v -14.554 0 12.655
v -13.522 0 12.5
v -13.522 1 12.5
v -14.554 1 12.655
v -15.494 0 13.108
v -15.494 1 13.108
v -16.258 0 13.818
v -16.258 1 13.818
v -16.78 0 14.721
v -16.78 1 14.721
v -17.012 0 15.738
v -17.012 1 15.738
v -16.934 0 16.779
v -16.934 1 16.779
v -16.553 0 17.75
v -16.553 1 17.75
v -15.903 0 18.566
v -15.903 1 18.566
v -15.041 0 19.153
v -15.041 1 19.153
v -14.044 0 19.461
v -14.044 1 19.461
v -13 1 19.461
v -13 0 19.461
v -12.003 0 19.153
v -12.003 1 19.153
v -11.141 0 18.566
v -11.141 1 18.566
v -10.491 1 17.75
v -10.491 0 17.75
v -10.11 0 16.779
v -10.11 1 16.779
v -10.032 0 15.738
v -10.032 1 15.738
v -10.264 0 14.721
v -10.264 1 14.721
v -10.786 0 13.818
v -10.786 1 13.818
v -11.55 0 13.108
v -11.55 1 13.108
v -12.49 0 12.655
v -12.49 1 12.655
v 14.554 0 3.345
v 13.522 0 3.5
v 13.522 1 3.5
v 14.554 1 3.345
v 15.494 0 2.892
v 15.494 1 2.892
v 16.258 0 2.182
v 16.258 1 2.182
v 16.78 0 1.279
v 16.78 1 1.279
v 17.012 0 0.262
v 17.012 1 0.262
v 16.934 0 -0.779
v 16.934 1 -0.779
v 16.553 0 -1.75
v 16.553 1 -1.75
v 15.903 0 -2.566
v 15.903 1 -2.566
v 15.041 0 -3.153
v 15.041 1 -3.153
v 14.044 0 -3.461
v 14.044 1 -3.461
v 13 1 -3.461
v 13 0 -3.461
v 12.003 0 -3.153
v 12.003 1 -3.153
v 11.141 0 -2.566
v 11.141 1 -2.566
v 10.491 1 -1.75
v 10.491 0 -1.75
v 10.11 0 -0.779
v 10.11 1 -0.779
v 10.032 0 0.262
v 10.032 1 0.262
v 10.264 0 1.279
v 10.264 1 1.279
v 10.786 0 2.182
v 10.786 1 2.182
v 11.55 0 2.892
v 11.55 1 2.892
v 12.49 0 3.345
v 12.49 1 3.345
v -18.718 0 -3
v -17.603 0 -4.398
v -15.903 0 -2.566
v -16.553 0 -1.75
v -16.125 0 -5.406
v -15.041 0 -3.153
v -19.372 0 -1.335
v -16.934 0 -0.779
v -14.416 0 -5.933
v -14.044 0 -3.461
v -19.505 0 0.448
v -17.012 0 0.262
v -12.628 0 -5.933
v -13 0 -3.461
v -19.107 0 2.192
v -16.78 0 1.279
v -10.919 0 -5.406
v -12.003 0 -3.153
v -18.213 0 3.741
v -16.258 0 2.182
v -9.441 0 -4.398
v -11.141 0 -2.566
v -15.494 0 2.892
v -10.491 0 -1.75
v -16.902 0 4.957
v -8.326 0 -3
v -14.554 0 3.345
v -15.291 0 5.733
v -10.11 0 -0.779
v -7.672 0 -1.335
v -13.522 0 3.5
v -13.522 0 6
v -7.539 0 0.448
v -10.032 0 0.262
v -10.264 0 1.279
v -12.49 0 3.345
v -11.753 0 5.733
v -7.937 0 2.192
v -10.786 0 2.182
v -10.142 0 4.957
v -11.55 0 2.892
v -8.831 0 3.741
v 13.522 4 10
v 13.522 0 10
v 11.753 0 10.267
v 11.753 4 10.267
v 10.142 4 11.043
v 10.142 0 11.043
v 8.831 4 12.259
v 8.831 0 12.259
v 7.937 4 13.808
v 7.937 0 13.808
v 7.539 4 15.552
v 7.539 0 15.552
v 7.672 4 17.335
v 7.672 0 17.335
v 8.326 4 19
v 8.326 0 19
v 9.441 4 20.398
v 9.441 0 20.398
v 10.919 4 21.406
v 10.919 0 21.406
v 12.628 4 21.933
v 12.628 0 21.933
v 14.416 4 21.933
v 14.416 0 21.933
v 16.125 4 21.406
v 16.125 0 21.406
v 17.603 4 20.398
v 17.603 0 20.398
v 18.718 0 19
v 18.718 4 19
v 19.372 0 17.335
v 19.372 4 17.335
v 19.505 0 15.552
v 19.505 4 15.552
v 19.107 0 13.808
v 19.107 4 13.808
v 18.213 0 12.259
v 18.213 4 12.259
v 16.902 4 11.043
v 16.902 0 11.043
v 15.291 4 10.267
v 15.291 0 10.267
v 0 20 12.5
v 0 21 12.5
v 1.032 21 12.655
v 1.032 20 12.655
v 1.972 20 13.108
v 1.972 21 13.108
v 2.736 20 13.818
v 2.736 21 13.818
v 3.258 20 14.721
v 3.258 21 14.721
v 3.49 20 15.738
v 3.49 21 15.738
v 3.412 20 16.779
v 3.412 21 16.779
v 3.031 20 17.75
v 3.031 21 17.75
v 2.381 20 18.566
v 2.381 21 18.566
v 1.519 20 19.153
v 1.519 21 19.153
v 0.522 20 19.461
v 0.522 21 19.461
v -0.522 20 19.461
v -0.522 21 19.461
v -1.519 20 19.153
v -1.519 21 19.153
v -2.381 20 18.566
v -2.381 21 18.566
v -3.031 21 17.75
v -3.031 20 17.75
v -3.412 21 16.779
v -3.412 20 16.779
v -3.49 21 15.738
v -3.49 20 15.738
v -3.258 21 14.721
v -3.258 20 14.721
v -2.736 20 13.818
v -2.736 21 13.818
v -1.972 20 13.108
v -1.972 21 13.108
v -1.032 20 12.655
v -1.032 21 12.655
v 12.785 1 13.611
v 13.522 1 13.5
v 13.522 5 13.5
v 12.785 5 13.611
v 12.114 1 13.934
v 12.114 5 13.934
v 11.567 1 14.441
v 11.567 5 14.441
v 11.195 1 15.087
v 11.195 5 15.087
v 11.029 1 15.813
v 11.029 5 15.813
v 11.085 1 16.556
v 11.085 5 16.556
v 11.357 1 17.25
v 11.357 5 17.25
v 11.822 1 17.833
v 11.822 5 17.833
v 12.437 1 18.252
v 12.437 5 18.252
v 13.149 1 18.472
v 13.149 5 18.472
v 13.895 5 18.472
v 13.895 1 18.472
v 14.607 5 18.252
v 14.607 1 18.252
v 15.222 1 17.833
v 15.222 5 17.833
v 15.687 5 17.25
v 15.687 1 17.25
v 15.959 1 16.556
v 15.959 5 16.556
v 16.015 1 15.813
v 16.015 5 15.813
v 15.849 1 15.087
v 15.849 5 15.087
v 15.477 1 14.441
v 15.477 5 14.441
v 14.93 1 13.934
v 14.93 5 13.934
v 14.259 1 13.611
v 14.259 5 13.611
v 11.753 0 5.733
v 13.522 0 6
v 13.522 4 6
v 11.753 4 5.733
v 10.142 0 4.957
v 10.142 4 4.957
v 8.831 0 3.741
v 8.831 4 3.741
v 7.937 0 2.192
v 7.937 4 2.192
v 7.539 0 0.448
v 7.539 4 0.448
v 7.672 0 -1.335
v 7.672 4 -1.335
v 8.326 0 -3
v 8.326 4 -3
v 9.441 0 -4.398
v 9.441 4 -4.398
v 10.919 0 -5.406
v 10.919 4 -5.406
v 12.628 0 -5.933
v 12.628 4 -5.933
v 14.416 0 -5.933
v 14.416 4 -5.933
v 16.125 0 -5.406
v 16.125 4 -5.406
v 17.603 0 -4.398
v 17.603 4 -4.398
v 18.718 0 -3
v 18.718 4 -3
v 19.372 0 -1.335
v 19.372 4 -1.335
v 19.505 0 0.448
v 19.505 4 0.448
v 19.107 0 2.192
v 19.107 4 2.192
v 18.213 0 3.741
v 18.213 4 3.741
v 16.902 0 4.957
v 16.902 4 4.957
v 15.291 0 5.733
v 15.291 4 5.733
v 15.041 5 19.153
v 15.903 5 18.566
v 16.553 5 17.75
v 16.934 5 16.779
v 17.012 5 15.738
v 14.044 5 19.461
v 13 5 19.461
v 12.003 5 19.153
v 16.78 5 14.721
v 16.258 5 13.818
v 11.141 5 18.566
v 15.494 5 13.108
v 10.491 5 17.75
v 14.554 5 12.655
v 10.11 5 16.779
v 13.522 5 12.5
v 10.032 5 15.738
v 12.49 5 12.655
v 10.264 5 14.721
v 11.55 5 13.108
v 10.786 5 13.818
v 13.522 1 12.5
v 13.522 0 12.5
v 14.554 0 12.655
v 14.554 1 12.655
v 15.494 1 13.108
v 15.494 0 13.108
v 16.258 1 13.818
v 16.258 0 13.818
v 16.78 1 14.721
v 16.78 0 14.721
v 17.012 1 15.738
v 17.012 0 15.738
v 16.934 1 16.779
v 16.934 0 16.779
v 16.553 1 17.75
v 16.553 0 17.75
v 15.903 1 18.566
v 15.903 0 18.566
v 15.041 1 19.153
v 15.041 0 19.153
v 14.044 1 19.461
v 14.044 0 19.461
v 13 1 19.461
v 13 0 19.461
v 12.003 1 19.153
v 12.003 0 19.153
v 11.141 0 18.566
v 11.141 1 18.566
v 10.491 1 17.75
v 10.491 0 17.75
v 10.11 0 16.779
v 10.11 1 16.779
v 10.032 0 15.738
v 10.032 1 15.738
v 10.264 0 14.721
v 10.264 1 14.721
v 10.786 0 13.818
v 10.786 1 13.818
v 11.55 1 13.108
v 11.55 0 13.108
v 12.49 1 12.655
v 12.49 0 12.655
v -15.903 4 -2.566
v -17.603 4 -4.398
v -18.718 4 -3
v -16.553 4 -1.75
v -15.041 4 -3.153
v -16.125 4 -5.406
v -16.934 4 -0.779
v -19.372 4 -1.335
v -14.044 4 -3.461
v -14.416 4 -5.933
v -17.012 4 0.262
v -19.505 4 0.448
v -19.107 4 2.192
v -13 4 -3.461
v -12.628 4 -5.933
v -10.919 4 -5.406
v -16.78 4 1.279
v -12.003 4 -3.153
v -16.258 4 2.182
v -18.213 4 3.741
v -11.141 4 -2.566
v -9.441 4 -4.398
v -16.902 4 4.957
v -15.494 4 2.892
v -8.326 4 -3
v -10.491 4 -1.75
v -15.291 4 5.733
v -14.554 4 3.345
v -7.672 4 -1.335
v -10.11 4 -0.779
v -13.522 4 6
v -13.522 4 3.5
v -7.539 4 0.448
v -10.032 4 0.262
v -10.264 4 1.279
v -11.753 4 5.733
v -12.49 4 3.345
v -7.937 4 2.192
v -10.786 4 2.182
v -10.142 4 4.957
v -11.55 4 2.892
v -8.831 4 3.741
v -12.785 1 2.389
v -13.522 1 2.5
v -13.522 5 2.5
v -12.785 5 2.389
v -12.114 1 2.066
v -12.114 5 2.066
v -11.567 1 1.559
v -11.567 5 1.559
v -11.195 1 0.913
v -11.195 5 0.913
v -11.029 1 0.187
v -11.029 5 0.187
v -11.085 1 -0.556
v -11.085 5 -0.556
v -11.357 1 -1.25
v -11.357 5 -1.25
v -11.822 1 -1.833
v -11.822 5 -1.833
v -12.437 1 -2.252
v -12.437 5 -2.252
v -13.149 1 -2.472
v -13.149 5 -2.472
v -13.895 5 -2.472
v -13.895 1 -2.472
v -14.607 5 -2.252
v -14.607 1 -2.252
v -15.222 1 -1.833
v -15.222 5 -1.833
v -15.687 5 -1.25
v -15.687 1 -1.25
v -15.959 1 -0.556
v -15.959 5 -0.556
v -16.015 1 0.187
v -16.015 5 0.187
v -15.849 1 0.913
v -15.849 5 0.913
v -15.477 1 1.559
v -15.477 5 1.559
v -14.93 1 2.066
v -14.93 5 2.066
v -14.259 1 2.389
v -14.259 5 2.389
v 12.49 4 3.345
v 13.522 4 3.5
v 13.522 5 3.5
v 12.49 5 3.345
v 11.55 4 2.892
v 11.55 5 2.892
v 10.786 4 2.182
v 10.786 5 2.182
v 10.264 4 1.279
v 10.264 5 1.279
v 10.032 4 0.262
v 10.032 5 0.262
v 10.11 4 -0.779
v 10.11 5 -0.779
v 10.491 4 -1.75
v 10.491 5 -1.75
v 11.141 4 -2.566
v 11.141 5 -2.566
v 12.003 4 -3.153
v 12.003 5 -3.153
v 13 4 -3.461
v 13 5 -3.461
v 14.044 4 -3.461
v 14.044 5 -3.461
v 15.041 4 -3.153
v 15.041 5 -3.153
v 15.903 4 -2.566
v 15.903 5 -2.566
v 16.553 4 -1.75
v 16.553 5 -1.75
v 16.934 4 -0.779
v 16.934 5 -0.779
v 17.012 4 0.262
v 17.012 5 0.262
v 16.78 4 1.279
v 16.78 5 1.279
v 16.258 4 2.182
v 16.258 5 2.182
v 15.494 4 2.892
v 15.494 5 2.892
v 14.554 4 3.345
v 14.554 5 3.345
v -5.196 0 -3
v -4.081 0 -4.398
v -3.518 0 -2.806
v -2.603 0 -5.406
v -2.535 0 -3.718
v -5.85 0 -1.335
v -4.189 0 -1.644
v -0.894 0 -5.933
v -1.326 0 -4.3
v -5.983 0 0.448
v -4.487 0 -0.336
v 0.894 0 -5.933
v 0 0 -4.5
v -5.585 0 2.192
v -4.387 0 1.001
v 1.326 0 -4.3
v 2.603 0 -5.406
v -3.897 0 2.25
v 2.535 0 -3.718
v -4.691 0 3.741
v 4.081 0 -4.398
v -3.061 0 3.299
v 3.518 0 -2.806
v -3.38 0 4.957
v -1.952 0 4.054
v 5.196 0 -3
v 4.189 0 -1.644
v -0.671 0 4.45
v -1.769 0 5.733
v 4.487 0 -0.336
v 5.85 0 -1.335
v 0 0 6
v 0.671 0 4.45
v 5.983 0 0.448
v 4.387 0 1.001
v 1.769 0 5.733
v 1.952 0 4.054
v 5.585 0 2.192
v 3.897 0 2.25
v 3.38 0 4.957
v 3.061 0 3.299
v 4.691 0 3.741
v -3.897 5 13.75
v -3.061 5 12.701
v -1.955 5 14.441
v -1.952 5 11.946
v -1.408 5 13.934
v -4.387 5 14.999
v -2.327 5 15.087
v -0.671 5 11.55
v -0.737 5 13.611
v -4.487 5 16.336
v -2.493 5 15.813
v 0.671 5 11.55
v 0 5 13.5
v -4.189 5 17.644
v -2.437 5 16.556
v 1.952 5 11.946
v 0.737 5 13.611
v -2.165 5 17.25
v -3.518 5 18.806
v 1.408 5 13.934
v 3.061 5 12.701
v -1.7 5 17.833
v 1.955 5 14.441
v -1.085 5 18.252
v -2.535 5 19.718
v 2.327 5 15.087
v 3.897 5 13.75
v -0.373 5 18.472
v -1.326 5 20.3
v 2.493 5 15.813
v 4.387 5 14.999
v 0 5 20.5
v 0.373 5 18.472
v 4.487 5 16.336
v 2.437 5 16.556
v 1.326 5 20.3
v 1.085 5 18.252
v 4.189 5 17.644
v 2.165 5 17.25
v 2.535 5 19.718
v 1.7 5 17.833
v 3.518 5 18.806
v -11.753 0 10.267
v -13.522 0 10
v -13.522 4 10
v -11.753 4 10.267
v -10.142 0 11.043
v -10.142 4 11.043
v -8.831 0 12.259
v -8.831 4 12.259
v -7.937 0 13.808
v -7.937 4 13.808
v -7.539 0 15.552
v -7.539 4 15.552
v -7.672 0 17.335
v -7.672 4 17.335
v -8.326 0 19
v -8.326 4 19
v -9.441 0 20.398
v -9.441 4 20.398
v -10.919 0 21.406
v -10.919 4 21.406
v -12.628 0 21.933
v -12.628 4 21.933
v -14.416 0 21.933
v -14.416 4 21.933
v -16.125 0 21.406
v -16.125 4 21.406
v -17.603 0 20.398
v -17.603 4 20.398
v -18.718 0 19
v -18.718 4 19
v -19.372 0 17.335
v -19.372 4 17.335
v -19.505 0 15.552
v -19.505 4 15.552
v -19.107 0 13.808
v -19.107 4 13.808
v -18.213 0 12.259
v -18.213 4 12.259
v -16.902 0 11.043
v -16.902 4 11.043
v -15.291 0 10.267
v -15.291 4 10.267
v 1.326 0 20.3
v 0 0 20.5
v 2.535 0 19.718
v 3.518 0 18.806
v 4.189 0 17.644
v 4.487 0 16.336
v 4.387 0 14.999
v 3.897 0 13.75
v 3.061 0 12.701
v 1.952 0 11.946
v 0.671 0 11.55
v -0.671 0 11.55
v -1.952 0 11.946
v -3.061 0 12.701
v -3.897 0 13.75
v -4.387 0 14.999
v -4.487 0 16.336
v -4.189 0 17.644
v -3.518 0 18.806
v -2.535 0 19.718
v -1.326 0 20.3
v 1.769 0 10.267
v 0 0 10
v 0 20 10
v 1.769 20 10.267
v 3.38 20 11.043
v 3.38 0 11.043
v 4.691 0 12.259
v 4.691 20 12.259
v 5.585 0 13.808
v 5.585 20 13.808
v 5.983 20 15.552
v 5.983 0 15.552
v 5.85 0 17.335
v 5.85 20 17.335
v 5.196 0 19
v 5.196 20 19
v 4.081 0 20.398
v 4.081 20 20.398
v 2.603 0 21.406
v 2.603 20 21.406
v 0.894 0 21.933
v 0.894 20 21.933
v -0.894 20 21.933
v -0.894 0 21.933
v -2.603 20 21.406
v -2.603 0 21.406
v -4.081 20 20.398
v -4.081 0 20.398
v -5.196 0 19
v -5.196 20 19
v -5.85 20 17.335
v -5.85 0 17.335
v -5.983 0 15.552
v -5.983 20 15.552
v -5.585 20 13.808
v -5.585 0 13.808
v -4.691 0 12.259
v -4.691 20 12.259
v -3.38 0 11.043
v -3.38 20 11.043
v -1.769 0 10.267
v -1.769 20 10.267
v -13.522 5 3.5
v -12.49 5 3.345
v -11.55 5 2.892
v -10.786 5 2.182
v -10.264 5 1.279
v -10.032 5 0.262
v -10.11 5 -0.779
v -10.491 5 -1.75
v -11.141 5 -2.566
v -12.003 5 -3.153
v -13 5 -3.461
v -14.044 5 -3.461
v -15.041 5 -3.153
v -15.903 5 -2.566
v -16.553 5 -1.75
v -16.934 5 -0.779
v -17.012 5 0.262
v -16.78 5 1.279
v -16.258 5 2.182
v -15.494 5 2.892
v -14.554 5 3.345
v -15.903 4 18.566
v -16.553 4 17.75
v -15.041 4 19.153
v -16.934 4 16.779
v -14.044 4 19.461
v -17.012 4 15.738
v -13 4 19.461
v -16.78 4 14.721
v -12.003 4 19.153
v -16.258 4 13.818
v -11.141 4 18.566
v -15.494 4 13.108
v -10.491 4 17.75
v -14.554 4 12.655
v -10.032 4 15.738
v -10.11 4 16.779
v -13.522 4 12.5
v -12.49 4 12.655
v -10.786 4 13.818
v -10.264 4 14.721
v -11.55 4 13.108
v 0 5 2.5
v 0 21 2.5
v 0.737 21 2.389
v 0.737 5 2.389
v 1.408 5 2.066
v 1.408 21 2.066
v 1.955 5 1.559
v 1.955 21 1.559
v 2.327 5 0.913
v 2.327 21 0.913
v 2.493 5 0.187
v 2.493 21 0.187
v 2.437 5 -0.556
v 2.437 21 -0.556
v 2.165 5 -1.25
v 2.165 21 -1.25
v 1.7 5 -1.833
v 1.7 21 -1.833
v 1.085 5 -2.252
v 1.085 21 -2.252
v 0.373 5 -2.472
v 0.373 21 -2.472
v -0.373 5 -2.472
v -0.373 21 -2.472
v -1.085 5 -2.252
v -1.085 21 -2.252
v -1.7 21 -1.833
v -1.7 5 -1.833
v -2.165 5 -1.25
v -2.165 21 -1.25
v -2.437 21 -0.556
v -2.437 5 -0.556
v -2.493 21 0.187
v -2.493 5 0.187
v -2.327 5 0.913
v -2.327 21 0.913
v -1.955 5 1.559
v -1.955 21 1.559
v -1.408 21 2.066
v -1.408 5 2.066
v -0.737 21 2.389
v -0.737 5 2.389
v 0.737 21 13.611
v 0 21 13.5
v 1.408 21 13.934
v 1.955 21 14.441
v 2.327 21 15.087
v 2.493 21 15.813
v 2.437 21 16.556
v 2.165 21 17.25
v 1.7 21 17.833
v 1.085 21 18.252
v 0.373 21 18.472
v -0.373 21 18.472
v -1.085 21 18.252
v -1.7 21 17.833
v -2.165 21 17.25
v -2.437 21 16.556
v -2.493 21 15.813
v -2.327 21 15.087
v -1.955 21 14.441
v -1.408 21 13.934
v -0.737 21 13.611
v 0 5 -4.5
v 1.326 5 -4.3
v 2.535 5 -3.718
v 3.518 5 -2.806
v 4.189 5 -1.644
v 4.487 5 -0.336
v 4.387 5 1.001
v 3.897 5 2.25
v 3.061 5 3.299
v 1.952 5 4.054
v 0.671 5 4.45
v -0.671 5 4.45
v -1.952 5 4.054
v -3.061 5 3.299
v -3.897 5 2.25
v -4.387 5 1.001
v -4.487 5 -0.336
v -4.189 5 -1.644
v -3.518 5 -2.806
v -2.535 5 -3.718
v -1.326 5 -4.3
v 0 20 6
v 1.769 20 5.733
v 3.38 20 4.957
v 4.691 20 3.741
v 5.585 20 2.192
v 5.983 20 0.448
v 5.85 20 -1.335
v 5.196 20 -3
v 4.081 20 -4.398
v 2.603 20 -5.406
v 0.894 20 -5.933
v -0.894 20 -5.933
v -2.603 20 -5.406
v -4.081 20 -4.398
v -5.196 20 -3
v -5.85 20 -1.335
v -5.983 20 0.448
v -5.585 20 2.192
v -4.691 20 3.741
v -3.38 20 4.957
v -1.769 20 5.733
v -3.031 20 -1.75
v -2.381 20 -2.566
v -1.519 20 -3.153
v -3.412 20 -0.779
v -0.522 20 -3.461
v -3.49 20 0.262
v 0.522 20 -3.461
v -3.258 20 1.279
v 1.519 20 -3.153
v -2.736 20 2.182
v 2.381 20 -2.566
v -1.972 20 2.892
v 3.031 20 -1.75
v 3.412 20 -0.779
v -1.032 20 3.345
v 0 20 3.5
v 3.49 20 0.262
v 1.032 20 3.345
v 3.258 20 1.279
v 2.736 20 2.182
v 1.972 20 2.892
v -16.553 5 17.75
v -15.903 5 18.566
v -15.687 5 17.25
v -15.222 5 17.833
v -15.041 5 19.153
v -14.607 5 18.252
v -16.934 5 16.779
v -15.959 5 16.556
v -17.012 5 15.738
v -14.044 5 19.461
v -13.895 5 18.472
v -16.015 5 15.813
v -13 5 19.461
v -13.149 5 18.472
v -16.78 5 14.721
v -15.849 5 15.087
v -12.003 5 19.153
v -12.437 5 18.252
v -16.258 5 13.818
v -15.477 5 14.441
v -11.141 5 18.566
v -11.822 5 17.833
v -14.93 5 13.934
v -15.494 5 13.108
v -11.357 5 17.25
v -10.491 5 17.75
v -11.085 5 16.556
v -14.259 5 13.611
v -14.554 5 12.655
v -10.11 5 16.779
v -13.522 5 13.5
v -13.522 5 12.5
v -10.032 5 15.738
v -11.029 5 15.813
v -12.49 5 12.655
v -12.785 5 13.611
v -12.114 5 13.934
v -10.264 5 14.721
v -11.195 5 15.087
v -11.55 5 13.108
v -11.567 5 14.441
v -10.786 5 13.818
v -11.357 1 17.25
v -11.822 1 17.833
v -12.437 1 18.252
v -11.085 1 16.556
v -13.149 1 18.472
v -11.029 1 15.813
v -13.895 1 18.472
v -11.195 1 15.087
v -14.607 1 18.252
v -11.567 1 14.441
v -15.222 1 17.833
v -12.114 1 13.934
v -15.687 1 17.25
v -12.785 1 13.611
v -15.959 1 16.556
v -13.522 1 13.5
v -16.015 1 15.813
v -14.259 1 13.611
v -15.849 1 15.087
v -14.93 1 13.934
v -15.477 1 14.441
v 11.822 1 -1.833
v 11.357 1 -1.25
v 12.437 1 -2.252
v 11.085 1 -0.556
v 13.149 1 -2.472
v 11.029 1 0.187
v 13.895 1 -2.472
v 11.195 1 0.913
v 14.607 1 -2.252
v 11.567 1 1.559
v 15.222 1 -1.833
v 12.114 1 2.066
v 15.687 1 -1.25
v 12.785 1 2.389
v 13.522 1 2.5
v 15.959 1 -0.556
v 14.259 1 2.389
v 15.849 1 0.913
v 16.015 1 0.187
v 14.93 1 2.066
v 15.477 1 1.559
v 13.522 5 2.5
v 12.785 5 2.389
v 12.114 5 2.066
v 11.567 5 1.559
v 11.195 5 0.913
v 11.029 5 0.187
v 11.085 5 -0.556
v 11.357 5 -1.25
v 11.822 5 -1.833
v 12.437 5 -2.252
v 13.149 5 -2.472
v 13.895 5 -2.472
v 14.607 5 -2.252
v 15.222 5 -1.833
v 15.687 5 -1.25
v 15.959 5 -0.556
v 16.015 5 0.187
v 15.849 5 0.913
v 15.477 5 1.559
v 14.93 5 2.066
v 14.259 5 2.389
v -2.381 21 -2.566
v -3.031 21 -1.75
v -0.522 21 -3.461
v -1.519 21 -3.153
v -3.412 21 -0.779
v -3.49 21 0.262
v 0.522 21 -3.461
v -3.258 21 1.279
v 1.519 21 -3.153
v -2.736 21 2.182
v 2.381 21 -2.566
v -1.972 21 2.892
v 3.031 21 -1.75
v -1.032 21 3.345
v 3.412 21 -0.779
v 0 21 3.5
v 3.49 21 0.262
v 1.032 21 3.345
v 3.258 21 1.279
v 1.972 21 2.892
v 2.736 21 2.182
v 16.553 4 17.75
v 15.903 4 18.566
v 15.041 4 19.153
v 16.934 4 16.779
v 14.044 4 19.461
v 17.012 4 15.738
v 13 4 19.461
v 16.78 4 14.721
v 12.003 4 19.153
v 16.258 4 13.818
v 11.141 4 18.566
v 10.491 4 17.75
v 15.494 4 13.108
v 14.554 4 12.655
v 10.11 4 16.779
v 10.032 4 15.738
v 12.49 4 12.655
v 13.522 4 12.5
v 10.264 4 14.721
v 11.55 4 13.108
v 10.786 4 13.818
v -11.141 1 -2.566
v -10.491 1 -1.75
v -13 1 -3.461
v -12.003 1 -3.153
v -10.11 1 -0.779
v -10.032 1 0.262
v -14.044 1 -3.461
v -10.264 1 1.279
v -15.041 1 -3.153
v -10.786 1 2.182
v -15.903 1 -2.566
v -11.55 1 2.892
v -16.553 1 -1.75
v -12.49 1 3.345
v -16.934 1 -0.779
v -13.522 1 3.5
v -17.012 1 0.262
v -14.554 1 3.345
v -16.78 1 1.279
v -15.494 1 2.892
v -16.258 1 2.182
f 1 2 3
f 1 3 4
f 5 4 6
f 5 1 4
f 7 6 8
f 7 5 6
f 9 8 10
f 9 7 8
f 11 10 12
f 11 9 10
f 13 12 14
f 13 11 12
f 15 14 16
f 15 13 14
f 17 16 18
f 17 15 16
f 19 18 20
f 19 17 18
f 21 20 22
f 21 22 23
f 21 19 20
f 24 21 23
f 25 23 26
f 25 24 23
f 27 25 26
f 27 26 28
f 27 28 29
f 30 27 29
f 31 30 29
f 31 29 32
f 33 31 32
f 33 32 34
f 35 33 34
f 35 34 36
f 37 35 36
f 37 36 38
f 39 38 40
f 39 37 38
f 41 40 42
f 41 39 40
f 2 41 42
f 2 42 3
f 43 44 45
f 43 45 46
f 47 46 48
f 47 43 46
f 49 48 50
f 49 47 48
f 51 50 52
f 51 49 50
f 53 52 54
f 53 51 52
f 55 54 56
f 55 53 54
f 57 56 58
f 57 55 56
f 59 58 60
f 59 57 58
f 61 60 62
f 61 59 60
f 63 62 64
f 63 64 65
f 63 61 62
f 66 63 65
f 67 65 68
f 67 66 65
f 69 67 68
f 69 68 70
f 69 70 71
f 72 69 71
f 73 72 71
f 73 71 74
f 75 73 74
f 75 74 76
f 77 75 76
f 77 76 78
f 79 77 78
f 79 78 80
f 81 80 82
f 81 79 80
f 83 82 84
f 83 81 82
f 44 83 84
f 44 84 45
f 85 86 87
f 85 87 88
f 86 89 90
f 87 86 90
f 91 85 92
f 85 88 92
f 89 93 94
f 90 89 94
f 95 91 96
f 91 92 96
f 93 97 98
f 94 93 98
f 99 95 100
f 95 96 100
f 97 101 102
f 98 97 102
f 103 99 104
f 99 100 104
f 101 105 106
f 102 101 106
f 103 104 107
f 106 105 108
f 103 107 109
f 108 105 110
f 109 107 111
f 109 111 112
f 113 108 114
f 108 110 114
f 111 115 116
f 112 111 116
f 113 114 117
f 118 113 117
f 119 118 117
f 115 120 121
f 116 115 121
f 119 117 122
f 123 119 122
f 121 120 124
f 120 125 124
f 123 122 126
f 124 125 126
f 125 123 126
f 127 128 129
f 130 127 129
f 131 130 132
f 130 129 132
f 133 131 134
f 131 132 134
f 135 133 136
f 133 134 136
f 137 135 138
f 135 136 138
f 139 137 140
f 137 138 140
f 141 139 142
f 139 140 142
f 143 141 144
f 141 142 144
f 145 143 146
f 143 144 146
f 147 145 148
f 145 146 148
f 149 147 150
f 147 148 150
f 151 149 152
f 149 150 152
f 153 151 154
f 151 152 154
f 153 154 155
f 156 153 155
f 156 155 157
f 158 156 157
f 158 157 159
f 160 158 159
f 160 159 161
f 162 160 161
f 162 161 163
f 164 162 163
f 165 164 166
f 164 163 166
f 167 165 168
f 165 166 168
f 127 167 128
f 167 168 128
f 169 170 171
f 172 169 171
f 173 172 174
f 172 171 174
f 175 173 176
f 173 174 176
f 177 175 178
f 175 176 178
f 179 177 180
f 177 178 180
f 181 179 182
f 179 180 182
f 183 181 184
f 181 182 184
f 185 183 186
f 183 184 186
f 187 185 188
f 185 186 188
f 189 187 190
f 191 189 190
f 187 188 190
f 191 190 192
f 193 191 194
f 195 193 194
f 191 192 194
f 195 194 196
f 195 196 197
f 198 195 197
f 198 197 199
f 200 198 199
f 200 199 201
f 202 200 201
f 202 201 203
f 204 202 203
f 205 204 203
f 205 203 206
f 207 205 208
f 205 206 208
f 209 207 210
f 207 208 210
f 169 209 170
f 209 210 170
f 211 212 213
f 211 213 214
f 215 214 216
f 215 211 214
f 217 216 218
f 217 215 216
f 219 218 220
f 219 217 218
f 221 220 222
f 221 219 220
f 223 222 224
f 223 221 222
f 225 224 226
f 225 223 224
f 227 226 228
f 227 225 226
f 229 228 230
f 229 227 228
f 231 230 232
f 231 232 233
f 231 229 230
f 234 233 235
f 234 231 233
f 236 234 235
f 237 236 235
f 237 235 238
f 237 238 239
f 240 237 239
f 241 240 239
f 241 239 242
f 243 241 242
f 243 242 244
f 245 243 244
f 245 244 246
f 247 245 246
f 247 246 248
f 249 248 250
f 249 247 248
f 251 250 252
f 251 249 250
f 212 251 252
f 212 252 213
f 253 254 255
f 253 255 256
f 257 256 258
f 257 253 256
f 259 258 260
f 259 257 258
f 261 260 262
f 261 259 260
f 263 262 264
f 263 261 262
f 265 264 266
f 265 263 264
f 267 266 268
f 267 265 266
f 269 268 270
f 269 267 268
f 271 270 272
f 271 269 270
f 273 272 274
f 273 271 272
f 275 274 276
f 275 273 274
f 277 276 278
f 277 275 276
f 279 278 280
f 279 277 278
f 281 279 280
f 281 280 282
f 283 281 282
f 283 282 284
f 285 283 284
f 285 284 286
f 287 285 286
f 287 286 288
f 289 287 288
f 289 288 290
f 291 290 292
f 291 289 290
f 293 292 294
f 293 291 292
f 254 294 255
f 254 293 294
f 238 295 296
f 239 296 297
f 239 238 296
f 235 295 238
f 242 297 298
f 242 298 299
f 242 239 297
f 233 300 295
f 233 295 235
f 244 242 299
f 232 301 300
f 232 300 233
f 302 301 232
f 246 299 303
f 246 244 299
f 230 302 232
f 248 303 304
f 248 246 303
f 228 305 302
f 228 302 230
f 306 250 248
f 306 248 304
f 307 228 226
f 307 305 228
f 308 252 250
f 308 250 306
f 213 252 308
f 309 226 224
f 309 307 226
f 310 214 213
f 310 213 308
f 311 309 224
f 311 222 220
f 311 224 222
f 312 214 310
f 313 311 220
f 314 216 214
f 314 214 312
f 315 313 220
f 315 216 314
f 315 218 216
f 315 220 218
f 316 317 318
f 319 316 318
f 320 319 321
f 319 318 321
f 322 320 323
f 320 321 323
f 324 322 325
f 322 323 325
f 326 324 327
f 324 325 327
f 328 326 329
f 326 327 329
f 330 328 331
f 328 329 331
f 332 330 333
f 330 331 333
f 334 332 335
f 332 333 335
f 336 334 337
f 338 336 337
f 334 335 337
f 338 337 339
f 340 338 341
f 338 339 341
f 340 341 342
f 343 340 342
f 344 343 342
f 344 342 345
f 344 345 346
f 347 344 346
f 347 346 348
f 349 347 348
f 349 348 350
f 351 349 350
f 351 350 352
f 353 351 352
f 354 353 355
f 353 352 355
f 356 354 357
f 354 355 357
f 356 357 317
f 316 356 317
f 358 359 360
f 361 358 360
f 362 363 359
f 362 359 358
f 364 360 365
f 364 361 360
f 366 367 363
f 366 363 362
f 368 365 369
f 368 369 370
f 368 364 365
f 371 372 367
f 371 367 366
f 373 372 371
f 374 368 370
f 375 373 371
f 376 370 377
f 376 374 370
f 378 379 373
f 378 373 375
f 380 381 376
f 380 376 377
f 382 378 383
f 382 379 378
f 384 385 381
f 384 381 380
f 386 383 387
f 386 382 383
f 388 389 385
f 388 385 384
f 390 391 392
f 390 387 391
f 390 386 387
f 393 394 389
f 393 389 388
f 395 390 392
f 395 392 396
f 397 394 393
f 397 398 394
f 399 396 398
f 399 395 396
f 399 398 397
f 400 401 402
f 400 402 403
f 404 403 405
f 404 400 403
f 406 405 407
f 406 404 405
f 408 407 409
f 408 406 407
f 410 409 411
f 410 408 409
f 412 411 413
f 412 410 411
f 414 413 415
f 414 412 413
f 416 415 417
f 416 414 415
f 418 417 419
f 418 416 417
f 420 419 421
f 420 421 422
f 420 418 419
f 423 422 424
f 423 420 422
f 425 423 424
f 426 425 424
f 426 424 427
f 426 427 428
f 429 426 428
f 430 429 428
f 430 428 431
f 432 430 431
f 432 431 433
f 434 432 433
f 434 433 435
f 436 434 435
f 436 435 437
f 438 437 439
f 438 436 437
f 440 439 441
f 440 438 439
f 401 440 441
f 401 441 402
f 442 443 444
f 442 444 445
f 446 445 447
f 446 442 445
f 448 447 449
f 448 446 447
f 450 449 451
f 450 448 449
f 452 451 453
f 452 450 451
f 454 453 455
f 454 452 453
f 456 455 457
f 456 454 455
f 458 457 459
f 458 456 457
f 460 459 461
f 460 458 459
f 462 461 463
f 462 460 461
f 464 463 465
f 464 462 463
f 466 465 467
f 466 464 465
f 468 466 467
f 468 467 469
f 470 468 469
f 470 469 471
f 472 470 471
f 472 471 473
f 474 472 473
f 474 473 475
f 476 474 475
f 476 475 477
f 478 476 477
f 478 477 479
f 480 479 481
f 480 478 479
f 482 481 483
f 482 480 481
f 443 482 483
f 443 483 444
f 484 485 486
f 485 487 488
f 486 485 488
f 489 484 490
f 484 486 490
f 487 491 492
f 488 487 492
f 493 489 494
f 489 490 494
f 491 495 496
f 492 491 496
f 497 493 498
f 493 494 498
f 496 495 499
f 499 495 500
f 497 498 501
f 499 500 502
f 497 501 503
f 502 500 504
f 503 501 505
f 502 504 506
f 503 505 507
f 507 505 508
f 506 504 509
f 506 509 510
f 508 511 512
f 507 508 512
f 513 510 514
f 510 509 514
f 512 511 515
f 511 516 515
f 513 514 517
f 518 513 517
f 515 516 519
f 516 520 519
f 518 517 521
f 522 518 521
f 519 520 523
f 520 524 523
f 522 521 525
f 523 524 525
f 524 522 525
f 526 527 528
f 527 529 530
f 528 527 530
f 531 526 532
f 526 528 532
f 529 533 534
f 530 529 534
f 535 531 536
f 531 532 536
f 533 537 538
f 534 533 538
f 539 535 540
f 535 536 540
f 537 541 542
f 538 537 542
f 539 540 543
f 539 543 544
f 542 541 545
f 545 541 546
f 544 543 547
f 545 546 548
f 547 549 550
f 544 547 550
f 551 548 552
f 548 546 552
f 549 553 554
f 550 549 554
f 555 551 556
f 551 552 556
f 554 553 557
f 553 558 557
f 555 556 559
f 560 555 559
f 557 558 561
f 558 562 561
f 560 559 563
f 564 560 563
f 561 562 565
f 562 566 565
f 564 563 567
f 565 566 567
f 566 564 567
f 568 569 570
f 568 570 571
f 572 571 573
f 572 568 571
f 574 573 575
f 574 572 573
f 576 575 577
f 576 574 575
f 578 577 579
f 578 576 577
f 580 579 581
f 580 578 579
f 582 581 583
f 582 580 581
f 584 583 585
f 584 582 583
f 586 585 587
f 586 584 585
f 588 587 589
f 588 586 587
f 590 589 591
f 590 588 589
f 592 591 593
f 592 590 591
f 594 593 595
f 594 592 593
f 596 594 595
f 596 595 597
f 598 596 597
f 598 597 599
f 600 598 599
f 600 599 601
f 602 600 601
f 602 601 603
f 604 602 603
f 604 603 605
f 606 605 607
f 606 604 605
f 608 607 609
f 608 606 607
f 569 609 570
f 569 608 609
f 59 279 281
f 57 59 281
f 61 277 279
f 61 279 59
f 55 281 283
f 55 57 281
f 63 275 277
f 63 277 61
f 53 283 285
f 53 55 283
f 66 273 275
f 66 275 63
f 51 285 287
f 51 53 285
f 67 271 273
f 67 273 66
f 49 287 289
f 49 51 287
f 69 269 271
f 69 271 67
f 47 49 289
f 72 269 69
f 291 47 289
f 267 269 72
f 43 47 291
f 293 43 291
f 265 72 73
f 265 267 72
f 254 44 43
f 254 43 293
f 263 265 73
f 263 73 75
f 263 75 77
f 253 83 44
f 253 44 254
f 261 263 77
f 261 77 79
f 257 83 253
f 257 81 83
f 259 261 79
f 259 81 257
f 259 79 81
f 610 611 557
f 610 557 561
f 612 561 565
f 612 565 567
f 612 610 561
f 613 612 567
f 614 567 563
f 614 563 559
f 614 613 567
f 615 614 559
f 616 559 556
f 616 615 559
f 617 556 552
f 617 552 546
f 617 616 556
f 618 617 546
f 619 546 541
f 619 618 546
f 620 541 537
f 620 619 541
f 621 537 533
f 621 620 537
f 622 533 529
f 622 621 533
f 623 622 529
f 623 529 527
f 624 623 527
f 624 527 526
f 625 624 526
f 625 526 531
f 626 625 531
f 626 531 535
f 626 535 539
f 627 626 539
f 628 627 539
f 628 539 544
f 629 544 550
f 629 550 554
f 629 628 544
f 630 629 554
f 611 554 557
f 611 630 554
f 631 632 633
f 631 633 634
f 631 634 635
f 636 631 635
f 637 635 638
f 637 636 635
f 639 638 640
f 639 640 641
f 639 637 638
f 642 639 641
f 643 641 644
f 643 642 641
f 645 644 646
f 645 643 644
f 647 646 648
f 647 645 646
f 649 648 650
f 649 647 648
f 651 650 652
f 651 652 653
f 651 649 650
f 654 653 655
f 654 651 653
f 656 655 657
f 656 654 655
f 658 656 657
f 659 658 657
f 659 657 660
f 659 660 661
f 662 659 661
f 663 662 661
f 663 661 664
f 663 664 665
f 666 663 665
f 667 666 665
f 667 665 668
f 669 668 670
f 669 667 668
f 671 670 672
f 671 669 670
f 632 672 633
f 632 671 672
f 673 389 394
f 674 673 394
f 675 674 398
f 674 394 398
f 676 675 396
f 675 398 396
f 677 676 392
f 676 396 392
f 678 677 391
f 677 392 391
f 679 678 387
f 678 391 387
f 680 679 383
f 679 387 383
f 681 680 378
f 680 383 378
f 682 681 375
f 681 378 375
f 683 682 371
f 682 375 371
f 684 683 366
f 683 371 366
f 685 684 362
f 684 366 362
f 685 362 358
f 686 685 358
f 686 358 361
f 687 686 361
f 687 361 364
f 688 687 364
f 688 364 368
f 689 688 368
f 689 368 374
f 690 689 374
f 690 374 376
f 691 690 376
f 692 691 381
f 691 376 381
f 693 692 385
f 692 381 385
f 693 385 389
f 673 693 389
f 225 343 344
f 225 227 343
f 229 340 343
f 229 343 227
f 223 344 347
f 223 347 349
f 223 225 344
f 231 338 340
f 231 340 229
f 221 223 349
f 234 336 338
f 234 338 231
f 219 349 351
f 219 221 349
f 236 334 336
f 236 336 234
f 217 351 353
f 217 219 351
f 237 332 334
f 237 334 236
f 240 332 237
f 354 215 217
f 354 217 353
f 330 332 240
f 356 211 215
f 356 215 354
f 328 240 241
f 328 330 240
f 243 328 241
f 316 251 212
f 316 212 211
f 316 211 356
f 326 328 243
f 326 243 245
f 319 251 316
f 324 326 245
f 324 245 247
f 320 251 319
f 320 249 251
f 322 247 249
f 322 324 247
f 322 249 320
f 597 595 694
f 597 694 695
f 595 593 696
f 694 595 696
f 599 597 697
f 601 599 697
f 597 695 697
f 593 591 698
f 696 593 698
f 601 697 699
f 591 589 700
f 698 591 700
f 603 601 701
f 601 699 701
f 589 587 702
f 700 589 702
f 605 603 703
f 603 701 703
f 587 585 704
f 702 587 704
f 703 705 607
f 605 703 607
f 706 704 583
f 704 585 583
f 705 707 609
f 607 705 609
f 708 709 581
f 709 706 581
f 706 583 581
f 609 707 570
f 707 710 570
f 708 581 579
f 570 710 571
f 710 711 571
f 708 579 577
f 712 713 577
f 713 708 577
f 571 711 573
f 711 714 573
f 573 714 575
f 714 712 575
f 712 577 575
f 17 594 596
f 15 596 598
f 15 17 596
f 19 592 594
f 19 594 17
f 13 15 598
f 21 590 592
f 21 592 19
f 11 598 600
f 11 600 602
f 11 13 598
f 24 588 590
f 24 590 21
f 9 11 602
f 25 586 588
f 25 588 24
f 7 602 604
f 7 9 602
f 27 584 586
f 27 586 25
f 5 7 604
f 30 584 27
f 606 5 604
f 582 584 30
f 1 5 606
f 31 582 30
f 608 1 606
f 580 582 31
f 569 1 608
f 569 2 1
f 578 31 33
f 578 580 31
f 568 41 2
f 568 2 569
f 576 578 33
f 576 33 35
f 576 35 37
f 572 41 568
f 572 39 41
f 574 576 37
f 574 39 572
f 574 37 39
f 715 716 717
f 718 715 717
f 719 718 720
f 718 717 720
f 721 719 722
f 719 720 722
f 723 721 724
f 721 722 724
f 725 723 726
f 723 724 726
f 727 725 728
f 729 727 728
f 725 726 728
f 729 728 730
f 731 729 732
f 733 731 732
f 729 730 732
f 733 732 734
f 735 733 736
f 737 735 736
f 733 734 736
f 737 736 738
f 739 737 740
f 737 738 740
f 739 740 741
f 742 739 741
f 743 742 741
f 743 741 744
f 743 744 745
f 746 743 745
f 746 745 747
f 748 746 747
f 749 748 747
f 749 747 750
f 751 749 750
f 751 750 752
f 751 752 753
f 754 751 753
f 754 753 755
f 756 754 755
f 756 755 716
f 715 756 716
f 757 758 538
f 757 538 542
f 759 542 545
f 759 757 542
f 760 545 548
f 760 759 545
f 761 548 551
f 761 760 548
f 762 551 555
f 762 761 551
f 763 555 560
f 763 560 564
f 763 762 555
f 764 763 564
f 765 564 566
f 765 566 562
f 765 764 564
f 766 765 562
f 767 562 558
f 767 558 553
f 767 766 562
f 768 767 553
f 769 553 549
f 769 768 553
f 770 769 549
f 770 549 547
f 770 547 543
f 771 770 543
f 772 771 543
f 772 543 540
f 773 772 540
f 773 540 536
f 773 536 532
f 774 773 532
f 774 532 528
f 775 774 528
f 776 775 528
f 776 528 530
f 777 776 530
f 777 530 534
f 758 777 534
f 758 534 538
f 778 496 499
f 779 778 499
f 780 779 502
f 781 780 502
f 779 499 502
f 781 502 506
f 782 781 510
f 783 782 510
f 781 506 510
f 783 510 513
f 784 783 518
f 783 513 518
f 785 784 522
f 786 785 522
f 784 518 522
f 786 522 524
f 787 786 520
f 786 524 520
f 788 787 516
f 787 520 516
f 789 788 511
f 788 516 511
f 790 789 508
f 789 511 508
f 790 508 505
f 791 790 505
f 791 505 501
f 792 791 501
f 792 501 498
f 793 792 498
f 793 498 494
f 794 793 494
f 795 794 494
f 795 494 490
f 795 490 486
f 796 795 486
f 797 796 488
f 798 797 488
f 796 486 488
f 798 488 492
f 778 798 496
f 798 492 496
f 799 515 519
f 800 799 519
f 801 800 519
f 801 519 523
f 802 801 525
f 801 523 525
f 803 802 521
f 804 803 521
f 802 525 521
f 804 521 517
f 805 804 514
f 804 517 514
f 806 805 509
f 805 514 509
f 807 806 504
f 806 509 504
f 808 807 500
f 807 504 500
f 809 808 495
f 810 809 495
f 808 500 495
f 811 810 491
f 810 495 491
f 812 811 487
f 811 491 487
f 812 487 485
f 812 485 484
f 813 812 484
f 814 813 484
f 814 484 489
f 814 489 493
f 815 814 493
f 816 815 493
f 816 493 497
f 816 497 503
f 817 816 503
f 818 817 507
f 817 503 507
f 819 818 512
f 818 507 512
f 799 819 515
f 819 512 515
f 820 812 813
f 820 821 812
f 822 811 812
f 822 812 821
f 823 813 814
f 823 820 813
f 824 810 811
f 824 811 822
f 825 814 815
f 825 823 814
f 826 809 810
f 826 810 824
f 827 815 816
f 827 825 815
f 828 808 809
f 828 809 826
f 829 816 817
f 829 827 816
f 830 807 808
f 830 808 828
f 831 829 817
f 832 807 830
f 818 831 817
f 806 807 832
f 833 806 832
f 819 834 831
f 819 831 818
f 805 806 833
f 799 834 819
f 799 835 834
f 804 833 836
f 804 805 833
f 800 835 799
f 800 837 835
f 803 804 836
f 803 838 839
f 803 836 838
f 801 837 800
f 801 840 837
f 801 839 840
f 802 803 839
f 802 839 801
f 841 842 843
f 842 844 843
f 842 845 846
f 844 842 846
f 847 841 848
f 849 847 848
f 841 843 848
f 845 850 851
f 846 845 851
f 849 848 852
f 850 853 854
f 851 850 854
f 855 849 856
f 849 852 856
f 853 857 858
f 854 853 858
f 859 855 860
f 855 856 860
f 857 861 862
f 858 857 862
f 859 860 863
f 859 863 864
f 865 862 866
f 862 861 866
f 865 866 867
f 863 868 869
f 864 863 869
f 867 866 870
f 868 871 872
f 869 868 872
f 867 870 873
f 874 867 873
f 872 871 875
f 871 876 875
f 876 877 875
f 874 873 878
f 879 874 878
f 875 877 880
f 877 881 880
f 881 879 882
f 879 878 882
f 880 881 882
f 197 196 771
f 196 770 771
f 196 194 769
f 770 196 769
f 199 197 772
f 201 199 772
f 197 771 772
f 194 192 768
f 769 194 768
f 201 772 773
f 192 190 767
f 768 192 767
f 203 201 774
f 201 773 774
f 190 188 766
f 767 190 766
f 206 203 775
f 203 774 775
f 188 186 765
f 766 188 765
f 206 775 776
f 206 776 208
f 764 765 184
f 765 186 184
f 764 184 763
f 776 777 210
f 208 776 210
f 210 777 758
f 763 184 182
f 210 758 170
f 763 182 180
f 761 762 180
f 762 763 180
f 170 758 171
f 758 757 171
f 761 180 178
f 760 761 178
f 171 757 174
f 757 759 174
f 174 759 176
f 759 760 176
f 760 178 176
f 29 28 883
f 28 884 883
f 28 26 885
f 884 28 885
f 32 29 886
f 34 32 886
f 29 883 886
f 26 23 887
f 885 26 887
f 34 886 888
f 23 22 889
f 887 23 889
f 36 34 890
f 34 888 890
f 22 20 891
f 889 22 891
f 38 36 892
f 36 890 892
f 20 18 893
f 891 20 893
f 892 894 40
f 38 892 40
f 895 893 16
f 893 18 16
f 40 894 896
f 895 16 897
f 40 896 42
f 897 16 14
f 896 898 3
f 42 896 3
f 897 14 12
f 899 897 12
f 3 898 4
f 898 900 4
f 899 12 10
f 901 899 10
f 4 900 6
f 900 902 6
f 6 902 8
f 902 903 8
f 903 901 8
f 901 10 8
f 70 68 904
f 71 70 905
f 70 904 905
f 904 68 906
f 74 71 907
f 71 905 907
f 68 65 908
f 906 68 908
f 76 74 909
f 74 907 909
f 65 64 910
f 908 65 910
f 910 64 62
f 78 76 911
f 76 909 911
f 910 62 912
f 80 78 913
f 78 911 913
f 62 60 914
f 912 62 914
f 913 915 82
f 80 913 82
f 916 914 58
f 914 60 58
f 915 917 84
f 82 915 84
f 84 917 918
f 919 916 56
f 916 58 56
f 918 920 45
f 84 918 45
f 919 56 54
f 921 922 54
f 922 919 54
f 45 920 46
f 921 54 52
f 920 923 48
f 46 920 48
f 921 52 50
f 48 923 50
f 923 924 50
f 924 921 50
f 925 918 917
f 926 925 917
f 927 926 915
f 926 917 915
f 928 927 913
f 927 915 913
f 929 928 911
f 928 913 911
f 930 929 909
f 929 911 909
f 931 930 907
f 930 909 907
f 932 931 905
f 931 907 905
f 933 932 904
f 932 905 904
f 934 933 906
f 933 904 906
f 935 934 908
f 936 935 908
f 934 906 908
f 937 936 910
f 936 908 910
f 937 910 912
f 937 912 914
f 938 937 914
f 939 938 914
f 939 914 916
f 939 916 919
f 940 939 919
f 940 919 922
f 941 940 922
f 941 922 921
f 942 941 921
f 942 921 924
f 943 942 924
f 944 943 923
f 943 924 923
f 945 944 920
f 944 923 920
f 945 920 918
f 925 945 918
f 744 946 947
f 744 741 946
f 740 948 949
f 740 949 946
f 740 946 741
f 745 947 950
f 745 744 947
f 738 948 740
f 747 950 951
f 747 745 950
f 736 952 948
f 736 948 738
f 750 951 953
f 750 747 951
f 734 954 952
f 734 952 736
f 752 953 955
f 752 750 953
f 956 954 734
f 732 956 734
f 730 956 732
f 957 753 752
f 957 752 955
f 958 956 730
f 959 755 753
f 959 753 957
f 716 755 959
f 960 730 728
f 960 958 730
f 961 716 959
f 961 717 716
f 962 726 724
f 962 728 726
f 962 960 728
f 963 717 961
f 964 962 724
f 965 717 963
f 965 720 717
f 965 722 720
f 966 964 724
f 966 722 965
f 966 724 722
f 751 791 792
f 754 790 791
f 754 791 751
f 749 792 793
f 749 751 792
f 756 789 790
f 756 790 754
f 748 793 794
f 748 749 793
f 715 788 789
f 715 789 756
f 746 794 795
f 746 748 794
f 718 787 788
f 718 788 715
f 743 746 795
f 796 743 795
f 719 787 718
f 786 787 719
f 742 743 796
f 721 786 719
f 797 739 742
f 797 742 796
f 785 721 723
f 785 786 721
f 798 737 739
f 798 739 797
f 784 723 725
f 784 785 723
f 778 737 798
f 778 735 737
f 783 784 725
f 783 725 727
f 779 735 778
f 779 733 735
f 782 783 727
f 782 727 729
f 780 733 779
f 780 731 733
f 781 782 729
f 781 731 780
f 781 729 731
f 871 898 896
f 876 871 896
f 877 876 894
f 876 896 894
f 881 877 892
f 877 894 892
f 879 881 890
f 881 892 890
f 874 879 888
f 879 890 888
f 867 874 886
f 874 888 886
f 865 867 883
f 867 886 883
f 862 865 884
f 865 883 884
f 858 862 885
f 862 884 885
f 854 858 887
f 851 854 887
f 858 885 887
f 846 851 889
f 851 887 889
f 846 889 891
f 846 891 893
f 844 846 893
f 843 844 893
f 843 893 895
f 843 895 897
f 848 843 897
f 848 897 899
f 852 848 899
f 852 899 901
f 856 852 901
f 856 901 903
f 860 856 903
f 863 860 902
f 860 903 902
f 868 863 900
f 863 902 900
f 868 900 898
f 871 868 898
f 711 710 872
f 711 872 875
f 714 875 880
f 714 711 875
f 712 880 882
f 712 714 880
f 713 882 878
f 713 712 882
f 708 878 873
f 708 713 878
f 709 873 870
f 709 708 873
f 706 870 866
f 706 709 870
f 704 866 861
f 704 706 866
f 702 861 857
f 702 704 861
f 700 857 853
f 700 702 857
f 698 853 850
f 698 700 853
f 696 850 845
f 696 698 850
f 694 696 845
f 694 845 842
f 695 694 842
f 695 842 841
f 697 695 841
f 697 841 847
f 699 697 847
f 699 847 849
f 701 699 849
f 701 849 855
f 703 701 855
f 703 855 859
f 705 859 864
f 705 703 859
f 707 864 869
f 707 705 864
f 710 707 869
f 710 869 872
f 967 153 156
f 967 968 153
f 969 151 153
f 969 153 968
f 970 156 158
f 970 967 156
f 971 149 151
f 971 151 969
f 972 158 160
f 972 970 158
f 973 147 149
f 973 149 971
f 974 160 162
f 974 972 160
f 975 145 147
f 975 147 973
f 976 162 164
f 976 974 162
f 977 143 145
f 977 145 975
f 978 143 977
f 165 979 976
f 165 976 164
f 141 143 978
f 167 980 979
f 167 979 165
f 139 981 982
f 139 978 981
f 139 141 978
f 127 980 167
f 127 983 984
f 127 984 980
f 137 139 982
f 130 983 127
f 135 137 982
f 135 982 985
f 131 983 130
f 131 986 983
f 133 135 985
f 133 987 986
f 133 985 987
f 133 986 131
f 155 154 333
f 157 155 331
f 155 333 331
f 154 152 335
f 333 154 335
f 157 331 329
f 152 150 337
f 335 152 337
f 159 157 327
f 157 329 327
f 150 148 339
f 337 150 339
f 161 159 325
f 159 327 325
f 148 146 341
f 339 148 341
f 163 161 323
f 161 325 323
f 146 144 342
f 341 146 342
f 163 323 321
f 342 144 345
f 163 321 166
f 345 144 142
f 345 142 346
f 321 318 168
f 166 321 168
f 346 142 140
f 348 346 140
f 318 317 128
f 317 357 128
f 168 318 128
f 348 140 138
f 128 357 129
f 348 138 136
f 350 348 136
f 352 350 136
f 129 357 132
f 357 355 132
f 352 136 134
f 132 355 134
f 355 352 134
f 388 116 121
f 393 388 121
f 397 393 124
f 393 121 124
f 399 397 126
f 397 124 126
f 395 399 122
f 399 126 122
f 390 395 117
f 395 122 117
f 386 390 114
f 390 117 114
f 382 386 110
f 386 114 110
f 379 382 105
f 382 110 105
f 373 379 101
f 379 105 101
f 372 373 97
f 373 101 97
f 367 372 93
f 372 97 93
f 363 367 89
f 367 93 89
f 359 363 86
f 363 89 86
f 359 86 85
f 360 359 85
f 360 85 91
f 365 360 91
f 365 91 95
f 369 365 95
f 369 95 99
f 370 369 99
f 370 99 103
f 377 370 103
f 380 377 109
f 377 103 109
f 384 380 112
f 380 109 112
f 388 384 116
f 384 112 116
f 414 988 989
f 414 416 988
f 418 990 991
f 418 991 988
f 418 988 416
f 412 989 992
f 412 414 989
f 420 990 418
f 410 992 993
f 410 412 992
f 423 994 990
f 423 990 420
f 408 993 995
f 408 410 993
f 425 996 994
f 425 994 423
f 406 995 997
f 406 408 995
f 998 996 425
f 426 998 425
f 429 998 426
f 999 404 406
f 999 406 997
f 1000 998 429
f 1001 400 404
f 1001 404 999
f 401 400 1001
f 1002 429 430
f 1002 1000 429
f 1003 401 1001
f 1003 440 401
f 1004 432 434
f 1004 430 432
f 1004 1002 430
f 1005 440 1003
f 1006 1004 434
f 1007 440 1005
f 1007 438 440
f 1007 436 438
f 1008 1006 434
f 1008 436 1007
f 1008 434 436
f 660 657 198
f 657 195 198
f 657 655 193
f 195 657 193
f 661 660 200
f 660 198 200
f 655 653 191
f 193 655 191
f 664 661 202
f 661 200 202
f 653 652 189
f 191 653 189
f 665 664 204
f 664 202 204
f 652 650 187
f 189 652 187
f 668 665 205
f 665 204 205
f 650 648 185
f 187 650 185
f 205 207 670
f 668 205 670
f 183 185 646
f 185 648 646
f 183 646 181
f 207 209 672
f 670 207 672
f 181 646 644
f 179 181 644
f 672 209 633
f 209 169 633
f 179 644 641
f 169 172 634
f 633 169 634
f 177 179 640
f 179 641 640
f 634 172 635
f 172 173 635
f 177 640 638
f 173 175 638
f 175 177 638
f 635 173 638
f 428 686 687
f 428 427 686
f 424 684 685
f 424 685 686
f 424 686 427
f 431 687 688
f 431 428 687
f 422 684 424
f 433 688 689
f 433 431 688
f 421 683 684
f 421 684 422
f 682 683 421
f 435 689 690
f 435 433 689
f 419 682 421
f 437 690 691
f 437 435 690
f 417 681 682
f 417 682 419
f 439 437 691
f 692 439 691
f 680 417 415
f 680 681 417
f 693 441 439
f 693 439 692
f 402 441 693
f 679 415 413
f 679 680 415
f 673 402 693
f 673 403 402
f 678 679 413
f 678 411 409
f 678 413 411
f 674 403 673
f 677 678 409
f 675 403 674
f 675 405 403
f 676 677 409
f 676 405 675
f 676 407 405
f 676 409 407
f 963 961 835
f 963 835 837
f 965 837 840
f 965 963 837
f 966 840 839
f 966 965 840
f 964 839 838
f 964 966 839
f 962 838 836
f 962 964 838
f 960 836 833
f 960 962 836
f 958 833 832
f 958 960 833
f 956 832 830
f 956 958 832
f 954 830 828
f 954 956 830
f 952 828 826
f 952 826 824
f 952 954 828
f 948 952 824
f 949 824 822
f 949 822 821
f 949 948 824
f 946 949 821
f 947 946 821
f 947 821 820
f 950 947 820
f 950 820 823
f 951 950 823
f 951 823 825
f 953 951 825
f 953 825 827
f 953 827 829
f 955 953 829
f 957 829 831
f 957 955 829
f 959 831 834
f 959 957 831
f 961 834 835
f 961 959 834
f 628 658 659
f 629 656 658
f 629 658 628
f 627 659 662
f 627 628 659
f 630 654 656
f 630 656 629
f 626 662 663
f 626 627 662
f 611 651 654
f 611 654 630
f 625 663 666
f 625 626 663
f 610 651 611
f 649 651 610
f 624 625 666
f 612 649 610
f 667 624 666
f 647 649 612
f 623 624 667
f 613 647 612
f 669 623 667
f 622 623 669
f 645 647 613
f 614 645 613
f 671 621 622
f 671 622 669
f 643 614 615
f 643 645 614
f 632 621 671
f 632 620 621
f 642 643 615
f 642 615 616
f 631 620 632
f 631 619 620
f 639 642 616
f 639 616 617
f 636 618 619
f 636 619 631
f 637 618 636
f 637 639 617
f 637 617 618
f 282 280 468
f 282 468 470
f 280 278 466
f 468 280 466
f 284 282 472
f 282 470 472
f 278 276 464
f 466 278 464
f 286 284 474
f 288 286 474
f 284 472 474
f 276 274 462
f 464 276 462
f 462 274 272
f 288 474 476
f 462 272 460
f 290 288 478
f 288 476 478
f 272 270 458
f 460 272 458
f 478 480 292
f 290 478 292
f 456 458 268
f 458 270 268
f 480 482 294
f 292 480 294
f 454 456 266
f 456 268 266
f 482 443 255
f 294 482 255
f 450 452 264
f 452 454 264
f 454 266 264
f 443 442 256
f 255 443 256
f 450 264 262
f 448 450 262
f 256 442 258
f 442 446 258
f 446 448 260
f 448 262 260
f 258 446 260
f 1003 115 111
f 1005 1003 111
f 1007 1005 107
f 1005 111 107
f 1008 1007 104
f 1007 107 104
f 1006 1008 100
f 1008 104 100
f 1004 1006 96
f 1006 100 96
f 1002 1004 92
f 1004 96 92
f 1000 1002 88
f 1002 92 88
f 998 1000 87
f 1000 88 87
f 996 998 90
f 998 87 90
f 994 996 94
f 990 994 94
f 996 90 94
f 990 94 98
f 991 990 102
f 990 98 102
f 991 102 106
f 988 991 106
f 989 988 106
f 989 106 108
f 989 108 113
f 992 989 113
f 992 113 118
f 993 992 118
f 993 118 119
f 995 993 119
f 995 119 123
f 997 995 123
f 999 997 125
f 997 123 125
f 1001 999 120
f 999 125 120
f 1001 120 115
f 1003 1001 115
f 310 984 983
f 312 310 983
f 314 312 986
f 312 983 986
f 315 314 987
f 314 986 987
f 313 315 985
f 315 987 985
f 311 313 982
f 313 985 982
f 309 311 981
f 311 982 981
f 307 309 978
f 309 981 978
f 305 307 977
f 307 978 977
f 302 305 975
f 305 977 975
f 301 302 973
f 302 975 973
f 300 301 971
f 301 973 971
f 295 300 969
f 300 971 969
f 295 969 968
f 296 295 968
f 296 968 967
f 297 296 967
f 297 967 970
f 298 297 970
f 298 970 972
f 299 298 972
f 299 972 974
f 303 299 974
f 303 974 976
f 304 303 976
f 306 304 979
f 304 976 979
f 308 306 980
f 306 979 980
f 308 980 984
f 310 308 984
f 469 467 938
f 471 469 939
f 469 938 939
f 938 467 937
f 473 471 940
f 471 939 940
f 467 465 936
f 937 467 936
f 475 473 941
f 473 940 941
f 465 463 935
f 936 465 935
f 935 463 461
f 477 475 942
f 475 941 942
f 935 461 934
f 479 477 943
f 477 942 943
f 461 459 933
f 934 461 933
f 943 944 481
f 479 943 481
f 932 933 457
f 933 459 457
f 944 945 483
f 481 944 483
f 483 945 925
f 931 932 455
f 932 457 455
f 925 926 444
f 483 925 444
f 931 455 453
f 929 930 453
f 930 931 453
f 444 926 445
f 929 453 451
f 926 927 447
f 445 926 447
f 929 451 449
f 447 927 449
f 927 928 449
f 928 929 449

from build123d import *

# Parameters (mm, degrees)
CROQUIS1_R              = 6
SALIENTE_EXTRUIR1_DEPTH = 20
CROQUIS2_R              = 2.5
CORTAR_EXTRUIR1_DEPTH   = 20
SALIENTE_EXTRUIR2_START = 1
CROQUIS3_R              = 3.5
CROQUIS3_R_2            = 2.5
SALIENTE_EXTRUIR2_DEPTH = 1
CROQUIS4_R              = 4.5
CORTAR_EXTRUIR2_DEPTH   = 5
CROQUIS5_R              = 6
SALIENTE_EXTRUIR3_DEPTH = 4
CROQUIS6_R              = 2.5
CORTAR_EXTRUIR3_DEPTH   = 4
CROQUIS7_R              = 3.5
CROQUIS7_R_2            = 2.5
SALIENTE_EXTRUIR4_DEPTH = 1
CROQUIS8_R              = 3.5
CROQUIS8_R_2            = 2.5
CORTAR_EXTRUIR4_DEPTH   = 1


with BuildPart() as part:
    # Croquis1 → Saliente-Extruir1 (new body)
    with BuildSketch(Plane(origin=(0, 0, 0), x_dir=(1, 0, 0), z_dir=(0, 1, 0))):
        with Locations(Location((0, 0, 0), (0, 0, 270))):
            Circle(CROQUIS1_R)
    extrude(amount=SALIENTE_EXTRUIR1_DEPTH)

    # Croquis2 → Cortar-Extruir1 (cut)
    with BuildSketch(Plane(origin=(0, 20, 0), x_dir=(1, 0, 0), z_dir=(0, 1, 0))):
        with Locations(Location((0, 0, 0), (0, 0, 270))):
            Circle(CROQUIS2_R)
    extrude(amount=-CORTAR_EXTRUIR1_DEPTH, mode=Mode.SUBTRACT)

    # Croquis3 → Saliente-Extruir2 (add)
    with BuildSketch(Plane(origin=(0, 20, 0), x_dir=(1, 0, 0), z_dir=(0, 1, 0)).offset(SALIENTE_EXTRUIR2_START)):
        with Locations(Location((0, 0, 0), (0, 0, 270))):
            Circle(CROQUIS3_R)
        with Locations(Location((0, 0, 0), (0, 0, 270))):
            Circle(CROQUIS3_R_2, mode=Mode.SUBTRACT)
    extrude(amount=-SALIENTE_EXTRUIR2_DEPTH)

    # Croquis4 → Cortar-Extruir2 (cut)
    with BuildSketch(Plane.XZ):
        with Locations(Location((0, 0, 0), (0, 0, 270))):
            Circle(CROQUIS4_R)
    extrude(amount=-CORTAR_EXTRUIR2_DEPTH, mode=Mode.SUBTRACT)


with BuildPart() as body_2:
    # Croquis5 → Saliente-Extruir3 (new body)
    with BuildSketch(Plane(origin=(0, 0, 0), x_dir=(1, 0, 0), z_dir=(0, 1, 0))):
        with Locations(Location((-13.521991575, 0, 0), (0, 0, 270))):
            Circle(CROQUIS5_R)
    extrude(amount=SALIENTE_EXTRUIR3_DEPTH)

    # Croquis6 → Cortar-Extruir3 (cut)
    with BuildSketch(Plane(origin=(0, 4, 0), x_dir=(1, 0, 0), z_dir=(0, 1, 0))):
        with Locations(Location((-13.521991575, 0, 0), (0, 0, 270))):
            Circle(CROQUIS6_R)
    extrude(amount=-CORTAR_EXTRUIR3_DEPTH, mode=Mode.SUBTRACT)

    # Croquis7 → Saliente-Extruir4 (add)
    with BuildSketch(Plane(origin=(0, 4, 0), x_dir=(1, 0, 0), z_dir=(0, 1, 0))):
        with Locations(Location((-13.521991575, 0, 0), (0, 0, 270))):
            Circle(CROQUIS7_R)
        with Locations(Location((-13.521991575, 0, 0), (0, 0, 270))):
            Circle(CROQUIS7_R_2, mode=Mode.SUBTRACT)
    extrude(amount=SALIENTE_EXTRUIR4_DEPTH)

    # Croquis8 → Cortar-Extruir4 (cut)
    with BuildSketch(Plane.XZ):
        with Locations(Location((-13.521991575, 0, 0), (0, 0, 90))):
            Circle(CROQUIS8_R)
        with Locations(Location((-13.521991575, 0, 0), (0, 0, 90))):
            Circle(CROQUIS8_R_2, mode=Mode.SUBTRACT)
    extrude(amount=-CORTAR_EXTRUIR4_DEPTH, mode=Mode.SUBTRACT)


with BuildPart() as body_3:
    # Simetría2: mirrored copy
    add(body_2.part.mirror(Plane(origin=(0, 0, 0), x_dir=(0, 0, 1), z_dir=(1, 0, 0))))


with BuildPart() as body_4:
    # Simetría3: mirrored copy
    add(body_3.part.mirror(Plane.XY.offset(8)))


with BuildPart() as body_5:
    # Simetr_a3 2: mirrored copy
    add(part.part.mirror(Plane.XY.offset(8)))


with BuildPart() as body_6:
    # Simetr_a3 3: mirrored copy
    add(body_2.part.mirror(Plane.XY.offset(8)))


solid = Compound([part.part, body_2.part, body_3.part, body_4.part, body_5.part, body_6.part])
